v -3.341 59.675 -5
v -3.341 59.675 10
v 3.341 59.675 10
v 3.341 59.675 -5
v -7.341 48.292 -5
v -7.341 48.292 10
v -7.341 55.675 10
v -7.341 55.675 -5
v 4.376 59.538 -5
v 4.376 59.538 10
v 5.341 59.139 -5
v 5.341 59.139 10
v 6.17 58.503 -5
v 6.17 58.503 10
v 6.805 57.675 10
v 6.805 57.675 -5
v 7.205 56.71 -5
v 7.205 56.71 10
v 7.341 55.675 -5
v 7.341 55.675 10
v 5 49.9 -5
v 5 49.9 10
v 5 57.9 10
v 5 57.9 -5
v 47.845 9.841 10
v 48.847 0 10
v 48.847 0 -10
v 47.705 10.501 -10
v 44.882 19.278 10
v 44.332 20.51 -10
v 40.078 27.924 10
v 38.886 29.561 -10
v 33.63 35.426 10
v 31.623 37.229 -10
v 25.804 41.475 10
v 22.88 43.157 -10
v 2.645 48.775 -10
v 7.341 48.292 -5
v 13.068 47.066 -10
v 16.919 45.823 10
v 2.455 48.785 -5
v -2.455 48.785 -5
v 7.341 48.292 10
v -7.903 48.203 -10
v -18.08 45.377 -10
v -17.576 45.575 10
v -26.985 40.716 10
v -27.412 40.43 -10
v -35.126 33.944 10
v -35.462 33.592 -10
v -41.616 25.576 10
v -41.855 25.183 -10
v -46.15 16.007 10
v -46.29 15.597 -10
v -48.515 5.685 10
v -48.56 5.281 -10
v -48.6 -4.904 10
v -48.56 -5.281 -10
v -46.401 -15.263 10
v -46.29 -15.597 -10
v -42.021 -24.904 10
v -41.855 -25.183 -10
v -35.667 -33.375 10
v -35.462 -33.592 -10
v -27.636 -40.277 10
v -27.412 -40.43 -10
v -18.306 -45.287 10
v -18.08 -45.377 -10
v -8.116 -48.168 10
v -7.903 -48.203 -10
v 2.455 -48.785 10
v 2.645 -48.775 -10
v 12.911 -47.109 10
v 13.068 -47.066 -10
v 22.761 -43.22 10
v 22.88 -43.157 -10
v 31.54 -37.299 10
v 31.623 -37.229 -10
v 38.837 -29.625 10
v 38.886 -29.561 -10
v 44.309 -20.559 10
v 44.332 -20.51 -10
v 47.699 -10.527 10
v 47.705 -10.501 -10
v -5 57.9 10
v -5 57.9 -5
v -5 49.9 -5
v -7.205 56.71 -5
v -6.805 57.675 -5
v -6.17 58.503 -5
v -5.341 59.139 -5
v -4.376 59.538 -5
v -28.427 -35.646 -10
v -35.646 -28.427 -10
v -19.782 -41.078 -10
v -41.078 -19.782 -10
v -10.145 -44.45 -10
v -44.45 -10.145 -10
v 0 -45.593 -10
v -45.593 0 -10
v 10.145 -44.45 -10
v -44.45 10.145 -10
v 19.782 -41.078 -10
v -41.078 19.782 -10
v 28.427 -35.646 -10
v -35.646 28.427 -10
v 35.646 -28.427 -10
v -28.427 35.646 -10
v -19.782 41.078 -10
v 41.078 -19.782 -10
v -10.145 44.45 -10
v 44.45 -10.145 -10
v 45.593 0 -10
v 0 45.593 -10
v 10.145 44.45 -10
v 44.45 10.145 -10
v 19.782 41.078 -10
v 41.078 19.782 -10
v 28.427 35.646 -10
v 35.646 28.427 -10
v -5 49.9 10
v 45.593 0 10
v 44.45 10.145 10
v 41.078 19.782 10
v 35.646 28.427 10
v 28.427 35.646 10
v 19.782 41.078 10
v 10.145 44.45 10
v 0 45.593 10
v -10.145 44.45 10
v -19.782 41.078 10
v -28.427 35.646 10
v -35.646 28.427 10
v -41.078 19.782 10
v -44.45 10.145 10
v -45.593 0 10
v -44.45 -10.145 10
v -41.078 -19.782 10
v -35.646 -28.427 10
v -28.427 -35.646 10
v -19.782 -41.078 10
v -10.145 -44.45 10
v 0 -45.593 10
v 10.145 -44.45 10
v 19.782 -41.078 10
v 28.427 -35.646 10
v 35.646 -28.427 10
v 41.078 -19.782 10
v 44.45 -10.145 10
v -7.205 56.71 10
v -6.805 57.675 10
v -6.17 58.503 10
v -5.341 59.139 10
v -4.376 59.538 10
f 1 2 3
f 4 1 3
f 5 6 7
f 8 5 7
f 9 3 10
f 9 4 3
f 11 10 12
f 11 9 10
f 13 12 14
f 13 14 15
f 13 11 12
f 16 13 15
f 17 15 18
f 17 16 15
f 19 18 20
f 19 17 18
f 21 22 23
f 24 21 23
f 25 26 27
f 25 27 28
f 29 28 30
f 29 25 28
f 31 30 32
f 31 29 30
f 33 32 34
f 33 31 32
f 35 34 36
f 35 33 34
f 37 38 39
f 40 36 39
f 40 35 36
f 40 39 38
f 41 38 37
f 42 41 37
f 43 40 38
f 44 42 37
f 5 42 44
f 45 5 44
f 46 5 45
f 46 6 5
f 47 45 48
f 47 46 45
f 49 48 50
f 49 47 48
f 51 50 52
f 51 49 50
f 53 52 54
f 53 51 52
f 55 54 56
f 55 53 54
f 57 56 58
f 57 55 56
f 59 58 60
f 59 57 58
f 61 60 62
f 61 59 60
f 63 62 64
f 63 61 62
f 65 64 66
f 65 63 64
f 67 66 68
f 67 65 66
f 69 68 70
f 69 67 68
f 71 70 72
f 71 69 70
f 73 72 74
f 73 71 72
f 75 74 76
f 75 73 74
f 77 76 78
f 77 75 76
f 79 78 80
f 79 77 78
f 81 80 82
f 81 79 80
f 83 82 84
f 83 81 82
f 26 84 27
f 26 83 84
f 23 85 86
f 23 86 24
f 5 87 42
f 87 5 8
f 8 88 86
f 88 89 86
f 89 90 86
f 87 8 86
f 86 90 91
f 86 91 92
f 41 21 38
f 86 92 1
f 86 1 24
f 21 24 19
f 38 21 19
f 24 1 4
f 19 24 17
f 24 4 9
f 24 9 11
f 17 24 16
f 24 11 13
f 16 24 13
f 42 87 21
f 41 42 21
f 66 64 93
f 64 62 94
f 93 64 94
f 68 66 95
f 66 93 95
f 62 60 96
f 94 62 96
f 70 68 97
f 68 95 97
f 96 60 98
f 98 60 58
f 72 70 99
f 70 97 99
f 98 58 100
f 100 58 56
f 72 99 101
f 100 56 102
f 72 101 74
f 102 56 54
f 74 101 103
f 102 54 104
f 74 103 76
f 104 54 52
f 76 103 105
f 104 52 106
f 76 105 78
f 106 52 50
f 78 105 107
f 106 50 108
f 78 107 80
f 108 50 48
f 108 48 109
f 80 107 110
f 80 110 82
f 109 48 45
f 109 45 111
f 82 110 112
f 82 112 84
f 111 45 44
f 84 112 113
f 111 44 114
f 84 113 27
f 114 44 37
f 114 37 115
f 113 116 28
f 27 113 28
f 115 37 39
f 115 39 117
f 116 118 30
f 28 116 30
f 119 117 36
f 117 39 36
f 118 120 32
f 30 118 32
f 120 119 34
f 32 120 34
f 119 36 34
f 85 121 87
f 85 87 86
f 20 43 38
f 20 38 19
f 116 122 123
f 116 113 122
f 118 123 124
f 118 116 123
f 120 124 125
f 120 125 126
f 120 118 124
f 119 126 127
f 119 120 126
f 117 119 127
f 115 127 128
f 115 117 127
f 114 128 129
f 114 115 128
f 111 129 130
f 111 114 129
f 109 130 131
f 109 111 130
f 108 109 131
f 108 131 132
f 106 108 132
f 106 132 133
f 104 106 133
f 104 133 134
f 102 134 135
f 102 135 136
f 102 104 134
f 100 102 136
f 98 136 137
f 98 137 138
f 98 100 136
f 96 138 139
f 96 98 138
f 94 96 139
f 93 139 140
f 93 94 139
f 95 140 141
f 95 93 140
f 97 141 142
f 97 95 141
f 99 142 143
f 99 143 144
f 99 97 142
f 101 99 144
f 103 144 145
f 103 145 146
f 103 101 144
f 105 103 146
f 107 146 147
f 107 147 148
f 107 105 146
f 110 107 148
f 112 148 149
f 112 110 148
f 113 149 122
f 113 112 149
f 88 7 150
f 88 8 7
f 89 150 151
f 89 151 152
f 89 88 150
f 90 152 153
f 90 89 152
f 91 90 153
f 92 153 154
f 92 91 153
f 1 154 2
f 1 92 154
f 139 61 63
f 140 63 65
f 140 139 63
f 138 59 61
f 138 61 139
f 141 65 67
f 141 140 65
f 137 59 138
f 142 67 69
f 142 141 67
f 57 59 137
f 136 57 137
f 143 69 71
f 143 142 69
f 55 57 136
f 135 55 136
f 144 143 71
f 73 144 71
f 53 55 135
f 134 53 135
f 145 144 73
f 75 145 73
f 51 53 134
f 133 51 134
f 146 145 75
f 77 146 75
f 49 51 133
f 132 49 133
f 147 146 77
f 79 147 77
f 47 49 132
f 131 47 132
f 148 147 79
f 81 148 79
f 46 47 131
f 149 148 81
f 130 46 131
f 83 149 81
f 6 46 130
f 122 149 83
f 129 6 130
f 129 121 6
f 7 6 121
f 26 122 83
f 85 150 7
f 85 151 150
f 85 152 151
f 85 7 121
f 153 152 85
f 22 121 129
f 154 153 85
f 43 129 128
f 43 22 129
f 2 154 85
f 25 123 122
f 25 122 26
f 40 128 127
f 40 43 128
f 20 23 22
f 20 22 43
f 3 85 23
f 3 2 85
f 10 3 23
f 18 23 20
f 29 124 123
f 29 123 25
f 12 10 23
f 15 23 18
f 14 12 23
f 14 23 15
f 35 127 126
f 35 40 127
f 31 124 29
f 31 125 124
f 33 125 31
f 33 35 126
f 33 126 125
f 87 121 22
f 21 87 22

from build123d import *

# Parameters (mm, degrees)
SKETCH1_R           = 48.846646741
SKETCH1_R_2         = 45.593095846
BOSS_EXTRUDE1_DEPTH = 10
SKETCH2_W           = 14.682281382
SKETCH2_H           = 11.549997154
SKETCH2_W_2         = 10
SKETCH2_H_2         = 8
BOSS_EXTRUDE2_DEPTH = 15
FILLET1_R           = 4


with BuildPart() as part:
    # Sketch1 → Boss-Extrude1 (new, symmetric)
    with BuildSketch(Plane.XY):
        Circle(SKETCH1_R)
        Circle(SKETCH1_R_2, mode=Mode.SUBTRACT)
    extrude(amount=BOSS_EXTRUDE1_DEPTH, both=True)

    # Sketch2 → Boss-Extrude2 (add)
    with BuildSketch(Plane.XY.offset(10)):
        with Locations((0, 53.899768405)):
            Rectangle(SKETCH2_W, SKETCH2_H)
        with Locations((0, 53.899768405)):
            Rectangle(SKETCH2_W_2, SKETCH2_H_2, mode=Mode.SUBTRACT)
    extrude(amount=-BOSS_EXTRUDE2_DEPTH)

    # Fillet1
    fillet1_edges = [part.edges().sort_by_distance(p)[0] for p in [
        (7.341140691, 59.674766982, 2.5),
        (-7.341140691, 59.674766982, 2.5),
    ]]
    fillet(fillet1_edges, radius=FILLET1_R)


solid = part.part
